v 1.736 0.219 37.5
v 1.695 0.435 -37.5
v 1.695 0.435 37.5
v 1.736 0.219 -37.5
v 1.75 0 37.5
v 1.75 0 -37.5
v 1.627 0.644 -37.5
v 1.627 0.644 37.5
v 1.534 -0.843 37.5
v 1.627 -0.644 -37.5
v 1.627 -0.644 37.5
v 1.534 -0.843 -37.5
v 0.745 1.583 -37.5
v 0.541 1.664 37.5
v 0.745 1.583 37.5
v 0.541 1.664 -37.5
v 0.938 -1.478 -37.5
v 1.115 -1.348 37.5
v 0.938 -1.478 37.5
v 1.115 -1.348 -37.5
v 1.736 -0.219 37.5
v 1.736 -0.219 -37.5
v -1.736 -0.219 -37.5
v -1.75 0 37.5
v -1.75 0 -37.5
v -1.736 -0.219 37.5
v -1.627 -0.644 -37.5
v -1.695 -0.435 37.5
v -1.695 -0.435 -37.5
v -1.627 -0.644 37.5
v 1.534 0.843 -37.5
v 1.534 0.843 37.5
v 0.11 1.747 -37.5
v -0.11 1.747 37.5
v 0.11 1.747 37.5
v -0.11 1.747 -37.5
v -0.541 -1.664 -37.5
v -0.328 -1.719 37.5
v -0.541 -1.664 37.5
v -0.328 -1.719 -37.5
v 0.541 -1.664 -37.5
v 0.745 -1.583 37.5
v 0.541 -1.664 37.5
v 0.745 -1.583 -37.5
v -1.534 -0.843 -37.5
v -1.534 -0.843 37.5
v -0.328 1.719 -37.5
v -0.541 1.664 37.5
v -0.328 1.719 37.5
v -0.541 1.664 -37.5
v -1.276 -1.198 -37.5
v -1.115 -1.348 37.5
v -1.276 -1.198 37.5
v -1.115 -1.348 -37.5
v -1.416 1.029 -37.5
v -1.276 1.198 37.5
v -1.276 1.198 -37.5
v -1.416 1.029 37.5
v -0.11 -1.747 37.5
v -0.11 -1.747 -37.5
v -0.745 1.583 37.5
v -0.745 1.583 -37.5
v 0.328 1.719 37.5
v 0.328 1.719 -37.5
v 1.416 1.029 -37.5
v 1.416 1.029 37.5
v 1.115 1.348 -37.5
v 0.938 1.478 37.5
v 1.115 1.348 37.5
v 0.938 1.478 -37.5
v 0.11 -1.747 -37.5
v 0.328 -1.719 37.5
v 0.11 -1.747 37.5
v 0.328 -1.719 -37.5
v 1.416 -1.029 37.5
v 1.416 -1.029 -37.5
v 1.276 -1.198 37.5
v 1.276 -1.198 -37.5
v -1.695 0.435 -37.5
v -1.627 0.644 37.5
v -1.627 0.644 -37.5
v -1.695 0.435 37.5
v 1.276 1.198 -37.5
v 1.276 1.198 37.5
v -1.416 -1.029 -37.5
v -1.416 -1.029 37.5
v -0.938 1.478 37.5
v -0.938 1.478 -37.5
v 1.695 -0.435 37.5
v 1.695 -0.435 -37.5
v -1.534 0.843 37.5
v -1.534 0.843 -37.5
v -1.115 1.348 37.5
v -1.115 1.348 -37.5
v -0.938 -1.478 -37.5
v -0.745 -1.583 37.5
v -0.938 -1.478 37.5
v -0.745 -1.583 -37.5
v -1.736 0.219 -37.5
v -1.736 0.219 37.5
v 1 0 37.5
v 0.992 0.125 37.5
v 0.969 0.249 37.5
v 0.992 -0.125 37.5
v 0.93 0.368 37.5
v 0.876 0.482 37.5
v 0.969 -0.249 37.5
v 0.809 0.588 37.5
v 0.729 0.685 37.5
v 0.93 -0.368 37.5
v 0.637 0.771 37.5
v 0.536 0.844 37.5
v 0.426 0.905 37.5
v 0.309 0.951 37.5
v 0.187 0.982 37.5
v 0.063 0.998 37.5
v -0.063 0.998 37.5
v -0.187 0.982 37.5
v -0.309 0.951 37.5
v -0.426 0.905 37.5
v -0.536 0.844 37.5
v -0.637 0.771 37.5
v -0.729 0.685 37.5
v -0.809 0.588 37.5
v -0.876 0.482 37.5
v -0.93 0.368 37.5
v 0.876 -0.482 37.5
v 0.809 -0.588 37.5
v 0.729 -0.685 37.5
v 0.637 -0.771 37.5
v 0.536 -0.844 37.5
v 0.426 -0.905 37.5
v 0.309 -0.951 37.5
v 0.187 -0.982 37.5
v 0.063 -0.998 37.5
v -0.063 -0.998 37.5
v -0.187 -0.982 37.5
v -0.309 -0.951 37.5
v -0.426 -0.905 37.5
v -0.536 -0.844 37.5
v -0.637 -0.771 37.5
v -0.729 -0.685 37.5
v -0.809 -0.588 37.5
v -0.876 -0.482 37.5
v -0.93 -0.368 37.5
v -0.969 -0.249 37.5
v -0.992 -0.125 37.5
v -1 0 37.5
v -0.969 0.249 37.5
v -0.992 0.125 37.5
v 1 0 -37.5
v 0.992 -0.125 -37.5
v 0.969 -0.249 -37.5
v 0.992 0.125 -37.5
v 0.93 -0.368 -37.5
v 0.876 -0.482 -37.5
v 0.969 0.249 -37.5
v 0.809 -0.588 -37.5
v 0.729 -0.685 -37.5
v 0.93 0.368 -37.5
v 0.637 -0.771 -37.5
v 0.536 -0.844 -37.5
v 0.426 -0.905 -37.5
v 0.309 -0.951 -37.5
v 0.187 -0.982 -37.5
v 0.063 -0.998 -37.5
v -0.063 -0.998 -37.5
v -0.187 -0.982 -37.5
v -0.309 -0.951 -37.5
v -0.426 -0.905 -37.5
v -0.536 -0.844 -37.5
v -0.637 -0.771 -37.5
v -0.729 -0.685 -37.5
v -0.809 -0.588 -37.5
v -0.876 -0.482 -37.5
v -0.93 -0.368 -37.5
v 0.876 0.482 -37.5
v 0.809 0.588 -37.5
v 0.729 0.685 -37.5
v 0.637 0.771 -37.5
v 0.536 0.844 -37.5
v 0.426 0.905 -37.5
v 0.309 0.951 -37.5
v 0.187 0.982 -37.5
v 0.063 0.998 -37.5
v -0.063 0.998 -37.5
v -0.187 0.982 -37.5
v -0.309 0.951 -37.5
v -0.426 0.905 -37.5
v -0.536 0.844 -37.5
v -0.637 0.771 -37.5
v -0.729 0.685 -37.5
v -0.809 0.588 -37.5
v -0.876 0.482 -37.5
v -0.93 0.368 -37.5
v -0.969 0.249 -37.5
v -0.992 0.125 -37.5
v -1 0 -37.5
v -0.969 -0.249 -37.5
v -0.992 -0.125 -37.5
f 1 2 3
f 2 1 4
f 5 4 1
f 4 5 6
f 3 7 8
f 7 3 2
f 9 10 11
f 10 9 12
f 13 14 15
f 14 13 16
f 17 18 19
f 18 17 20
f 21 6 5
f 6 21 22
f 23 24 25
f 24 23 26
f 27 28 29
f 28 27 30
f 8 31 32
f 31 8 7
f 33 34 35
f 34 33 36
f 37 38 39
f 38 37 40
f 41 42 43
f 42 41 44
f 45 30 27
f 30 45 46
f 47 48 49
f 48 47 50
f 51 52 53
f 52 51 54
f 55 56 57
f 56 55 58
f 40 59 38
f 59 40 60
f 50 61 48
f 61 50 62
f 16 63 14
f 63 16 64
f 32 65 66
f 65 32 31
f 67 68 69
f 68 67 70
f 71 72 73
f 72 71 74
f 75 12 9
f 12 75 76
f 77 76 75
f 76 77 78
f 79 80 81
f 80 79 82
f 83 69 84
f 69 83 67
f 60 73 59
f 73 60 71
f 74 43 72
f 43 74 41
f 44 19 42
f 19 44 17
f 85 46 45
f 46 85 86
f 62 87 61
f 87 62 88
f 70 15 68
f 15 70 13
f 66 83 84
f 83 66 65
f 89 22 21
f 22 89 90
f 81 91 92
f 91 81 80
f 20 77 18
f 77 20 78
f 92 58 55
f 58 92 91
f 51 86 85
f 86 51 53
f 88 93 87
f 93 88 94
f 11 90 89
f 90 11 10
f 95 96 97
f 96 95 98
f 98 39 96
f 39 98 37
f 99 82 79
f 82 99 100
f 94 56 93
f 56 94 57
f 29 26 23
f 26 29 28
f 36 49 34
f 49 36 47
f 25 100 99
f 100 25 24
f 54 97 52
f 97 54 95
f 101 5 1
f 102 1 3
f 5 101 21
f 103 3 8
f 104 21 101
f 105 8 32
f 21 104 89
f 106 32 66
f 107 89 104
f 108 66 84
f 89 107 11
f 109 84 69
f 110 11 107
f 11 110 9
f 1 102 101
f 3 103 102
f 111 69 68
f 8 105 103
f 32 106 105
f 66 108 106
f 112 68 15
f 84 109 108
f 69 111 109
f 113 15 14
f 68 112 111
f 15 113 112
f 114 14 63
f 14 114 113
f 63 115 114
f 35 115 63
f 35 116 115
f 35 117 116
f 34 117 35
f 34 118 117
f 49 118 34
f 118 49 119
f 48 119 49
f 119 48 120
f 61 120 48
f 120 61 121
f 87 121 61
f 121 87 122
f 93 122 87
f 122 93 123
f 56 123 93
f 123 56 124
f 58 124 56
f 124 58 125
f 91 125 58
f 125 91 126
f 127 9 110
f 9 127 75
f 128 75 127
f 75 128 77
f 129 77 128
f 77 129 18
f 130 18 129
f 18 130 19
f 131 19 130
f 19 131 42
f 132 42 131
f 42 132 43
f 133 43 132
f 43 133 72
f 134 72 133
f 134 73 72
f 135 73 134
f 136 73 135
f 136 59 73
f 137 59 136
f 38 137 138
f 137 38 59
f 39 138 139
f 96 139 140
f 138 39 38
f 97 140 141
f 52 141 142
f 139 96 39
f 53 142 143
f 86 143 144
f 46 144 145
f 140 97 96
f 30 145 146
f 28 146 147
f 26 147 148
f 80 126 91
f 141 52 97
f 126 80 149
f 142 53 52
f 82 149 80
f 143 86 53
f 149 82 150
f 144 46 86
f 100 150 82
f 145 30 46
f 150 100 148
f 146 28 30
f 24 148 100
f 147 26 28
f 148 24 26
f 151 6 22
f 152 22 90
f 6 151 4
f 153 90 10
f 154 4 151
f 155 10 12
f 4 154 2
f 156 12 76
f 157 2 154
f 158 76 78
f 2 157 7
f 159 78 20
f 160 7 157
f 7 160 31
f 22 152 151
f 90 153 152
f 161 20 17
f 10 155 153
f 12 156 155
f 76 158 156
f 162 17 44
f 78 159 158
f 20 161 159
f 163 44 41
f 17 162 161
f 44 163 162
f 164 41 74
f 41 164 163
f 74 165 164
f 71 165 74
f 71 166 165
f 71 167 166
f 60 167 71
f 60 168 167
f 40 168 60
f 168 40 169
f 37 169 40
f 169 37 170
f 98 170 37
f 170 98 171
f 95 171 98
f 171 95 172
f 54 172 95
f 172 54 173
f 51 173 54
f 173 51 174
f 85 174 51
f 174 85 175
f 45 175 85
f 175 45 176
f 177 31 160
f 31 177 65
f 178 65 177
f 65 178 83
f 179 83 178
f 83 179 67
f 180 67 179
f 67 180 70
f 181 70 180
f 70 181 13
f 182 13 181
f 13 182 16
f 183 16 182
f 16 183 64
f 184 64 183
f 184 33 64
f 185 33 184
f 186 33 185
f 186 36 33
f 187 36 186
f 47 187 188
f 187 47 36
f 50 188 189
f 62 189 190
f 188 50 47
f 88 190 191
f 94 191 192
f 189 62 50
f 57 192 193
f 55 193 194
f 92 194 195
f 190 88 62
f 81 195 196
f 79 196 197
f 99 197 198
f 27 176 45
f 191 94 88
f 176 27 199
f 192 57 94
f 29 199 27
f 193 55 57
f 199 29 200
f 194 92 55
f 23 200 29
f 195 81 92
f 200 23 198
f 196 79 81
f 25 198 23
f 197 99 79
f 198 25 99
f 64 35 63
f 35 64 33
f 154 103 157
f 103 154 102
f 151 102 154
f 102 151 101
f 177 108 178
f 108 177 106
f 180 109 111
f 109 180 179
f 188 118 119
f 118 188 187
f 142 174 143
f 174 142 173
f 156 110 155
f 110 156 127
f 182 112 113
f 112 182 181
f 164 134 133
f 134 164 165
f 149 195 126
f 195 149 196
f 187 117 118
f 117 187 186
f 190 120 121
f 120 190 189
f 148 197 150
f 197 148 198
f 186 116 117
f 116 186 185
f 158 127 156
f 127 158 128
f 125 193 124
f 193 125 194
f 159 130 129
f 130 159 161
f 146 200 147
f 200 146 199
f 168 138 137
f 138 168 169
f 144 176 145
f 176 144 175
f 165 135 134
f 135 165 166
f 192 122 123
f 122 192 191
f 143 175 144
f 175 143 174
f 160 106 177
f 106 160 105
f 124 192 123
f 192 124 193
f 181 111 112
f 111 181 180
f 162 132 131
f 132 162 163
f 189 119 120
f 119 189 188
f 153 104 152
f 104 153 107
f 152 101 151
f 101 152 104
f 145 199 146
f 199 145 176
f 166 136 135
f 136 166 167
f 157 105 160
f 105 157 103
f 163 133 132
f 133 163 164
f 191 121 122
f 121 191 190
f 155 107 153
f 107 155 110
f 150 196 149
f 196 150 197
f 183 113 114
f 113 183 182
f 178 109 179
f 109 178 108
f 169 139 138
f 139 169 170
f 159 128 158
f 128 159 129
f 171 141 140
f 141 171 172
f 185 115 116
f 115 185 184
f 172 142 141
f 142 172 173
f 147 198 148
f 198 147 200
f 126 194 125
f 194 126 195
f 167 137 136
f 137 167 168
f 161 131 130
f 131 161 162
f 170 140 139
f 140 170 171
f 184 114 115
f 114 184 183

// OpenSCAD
$fn = 50;


difference() {
	union() {
		translate(v = [0, 0, -37.5000000000]) {
			cylinder(h = 75, r = 1.7500000000);
		}
	}
	union() {
		translate(v = [0, 0, -100.0000000000]) {
			cylinder(h = 200, r = 1.0000000000);
		}
	}
}
